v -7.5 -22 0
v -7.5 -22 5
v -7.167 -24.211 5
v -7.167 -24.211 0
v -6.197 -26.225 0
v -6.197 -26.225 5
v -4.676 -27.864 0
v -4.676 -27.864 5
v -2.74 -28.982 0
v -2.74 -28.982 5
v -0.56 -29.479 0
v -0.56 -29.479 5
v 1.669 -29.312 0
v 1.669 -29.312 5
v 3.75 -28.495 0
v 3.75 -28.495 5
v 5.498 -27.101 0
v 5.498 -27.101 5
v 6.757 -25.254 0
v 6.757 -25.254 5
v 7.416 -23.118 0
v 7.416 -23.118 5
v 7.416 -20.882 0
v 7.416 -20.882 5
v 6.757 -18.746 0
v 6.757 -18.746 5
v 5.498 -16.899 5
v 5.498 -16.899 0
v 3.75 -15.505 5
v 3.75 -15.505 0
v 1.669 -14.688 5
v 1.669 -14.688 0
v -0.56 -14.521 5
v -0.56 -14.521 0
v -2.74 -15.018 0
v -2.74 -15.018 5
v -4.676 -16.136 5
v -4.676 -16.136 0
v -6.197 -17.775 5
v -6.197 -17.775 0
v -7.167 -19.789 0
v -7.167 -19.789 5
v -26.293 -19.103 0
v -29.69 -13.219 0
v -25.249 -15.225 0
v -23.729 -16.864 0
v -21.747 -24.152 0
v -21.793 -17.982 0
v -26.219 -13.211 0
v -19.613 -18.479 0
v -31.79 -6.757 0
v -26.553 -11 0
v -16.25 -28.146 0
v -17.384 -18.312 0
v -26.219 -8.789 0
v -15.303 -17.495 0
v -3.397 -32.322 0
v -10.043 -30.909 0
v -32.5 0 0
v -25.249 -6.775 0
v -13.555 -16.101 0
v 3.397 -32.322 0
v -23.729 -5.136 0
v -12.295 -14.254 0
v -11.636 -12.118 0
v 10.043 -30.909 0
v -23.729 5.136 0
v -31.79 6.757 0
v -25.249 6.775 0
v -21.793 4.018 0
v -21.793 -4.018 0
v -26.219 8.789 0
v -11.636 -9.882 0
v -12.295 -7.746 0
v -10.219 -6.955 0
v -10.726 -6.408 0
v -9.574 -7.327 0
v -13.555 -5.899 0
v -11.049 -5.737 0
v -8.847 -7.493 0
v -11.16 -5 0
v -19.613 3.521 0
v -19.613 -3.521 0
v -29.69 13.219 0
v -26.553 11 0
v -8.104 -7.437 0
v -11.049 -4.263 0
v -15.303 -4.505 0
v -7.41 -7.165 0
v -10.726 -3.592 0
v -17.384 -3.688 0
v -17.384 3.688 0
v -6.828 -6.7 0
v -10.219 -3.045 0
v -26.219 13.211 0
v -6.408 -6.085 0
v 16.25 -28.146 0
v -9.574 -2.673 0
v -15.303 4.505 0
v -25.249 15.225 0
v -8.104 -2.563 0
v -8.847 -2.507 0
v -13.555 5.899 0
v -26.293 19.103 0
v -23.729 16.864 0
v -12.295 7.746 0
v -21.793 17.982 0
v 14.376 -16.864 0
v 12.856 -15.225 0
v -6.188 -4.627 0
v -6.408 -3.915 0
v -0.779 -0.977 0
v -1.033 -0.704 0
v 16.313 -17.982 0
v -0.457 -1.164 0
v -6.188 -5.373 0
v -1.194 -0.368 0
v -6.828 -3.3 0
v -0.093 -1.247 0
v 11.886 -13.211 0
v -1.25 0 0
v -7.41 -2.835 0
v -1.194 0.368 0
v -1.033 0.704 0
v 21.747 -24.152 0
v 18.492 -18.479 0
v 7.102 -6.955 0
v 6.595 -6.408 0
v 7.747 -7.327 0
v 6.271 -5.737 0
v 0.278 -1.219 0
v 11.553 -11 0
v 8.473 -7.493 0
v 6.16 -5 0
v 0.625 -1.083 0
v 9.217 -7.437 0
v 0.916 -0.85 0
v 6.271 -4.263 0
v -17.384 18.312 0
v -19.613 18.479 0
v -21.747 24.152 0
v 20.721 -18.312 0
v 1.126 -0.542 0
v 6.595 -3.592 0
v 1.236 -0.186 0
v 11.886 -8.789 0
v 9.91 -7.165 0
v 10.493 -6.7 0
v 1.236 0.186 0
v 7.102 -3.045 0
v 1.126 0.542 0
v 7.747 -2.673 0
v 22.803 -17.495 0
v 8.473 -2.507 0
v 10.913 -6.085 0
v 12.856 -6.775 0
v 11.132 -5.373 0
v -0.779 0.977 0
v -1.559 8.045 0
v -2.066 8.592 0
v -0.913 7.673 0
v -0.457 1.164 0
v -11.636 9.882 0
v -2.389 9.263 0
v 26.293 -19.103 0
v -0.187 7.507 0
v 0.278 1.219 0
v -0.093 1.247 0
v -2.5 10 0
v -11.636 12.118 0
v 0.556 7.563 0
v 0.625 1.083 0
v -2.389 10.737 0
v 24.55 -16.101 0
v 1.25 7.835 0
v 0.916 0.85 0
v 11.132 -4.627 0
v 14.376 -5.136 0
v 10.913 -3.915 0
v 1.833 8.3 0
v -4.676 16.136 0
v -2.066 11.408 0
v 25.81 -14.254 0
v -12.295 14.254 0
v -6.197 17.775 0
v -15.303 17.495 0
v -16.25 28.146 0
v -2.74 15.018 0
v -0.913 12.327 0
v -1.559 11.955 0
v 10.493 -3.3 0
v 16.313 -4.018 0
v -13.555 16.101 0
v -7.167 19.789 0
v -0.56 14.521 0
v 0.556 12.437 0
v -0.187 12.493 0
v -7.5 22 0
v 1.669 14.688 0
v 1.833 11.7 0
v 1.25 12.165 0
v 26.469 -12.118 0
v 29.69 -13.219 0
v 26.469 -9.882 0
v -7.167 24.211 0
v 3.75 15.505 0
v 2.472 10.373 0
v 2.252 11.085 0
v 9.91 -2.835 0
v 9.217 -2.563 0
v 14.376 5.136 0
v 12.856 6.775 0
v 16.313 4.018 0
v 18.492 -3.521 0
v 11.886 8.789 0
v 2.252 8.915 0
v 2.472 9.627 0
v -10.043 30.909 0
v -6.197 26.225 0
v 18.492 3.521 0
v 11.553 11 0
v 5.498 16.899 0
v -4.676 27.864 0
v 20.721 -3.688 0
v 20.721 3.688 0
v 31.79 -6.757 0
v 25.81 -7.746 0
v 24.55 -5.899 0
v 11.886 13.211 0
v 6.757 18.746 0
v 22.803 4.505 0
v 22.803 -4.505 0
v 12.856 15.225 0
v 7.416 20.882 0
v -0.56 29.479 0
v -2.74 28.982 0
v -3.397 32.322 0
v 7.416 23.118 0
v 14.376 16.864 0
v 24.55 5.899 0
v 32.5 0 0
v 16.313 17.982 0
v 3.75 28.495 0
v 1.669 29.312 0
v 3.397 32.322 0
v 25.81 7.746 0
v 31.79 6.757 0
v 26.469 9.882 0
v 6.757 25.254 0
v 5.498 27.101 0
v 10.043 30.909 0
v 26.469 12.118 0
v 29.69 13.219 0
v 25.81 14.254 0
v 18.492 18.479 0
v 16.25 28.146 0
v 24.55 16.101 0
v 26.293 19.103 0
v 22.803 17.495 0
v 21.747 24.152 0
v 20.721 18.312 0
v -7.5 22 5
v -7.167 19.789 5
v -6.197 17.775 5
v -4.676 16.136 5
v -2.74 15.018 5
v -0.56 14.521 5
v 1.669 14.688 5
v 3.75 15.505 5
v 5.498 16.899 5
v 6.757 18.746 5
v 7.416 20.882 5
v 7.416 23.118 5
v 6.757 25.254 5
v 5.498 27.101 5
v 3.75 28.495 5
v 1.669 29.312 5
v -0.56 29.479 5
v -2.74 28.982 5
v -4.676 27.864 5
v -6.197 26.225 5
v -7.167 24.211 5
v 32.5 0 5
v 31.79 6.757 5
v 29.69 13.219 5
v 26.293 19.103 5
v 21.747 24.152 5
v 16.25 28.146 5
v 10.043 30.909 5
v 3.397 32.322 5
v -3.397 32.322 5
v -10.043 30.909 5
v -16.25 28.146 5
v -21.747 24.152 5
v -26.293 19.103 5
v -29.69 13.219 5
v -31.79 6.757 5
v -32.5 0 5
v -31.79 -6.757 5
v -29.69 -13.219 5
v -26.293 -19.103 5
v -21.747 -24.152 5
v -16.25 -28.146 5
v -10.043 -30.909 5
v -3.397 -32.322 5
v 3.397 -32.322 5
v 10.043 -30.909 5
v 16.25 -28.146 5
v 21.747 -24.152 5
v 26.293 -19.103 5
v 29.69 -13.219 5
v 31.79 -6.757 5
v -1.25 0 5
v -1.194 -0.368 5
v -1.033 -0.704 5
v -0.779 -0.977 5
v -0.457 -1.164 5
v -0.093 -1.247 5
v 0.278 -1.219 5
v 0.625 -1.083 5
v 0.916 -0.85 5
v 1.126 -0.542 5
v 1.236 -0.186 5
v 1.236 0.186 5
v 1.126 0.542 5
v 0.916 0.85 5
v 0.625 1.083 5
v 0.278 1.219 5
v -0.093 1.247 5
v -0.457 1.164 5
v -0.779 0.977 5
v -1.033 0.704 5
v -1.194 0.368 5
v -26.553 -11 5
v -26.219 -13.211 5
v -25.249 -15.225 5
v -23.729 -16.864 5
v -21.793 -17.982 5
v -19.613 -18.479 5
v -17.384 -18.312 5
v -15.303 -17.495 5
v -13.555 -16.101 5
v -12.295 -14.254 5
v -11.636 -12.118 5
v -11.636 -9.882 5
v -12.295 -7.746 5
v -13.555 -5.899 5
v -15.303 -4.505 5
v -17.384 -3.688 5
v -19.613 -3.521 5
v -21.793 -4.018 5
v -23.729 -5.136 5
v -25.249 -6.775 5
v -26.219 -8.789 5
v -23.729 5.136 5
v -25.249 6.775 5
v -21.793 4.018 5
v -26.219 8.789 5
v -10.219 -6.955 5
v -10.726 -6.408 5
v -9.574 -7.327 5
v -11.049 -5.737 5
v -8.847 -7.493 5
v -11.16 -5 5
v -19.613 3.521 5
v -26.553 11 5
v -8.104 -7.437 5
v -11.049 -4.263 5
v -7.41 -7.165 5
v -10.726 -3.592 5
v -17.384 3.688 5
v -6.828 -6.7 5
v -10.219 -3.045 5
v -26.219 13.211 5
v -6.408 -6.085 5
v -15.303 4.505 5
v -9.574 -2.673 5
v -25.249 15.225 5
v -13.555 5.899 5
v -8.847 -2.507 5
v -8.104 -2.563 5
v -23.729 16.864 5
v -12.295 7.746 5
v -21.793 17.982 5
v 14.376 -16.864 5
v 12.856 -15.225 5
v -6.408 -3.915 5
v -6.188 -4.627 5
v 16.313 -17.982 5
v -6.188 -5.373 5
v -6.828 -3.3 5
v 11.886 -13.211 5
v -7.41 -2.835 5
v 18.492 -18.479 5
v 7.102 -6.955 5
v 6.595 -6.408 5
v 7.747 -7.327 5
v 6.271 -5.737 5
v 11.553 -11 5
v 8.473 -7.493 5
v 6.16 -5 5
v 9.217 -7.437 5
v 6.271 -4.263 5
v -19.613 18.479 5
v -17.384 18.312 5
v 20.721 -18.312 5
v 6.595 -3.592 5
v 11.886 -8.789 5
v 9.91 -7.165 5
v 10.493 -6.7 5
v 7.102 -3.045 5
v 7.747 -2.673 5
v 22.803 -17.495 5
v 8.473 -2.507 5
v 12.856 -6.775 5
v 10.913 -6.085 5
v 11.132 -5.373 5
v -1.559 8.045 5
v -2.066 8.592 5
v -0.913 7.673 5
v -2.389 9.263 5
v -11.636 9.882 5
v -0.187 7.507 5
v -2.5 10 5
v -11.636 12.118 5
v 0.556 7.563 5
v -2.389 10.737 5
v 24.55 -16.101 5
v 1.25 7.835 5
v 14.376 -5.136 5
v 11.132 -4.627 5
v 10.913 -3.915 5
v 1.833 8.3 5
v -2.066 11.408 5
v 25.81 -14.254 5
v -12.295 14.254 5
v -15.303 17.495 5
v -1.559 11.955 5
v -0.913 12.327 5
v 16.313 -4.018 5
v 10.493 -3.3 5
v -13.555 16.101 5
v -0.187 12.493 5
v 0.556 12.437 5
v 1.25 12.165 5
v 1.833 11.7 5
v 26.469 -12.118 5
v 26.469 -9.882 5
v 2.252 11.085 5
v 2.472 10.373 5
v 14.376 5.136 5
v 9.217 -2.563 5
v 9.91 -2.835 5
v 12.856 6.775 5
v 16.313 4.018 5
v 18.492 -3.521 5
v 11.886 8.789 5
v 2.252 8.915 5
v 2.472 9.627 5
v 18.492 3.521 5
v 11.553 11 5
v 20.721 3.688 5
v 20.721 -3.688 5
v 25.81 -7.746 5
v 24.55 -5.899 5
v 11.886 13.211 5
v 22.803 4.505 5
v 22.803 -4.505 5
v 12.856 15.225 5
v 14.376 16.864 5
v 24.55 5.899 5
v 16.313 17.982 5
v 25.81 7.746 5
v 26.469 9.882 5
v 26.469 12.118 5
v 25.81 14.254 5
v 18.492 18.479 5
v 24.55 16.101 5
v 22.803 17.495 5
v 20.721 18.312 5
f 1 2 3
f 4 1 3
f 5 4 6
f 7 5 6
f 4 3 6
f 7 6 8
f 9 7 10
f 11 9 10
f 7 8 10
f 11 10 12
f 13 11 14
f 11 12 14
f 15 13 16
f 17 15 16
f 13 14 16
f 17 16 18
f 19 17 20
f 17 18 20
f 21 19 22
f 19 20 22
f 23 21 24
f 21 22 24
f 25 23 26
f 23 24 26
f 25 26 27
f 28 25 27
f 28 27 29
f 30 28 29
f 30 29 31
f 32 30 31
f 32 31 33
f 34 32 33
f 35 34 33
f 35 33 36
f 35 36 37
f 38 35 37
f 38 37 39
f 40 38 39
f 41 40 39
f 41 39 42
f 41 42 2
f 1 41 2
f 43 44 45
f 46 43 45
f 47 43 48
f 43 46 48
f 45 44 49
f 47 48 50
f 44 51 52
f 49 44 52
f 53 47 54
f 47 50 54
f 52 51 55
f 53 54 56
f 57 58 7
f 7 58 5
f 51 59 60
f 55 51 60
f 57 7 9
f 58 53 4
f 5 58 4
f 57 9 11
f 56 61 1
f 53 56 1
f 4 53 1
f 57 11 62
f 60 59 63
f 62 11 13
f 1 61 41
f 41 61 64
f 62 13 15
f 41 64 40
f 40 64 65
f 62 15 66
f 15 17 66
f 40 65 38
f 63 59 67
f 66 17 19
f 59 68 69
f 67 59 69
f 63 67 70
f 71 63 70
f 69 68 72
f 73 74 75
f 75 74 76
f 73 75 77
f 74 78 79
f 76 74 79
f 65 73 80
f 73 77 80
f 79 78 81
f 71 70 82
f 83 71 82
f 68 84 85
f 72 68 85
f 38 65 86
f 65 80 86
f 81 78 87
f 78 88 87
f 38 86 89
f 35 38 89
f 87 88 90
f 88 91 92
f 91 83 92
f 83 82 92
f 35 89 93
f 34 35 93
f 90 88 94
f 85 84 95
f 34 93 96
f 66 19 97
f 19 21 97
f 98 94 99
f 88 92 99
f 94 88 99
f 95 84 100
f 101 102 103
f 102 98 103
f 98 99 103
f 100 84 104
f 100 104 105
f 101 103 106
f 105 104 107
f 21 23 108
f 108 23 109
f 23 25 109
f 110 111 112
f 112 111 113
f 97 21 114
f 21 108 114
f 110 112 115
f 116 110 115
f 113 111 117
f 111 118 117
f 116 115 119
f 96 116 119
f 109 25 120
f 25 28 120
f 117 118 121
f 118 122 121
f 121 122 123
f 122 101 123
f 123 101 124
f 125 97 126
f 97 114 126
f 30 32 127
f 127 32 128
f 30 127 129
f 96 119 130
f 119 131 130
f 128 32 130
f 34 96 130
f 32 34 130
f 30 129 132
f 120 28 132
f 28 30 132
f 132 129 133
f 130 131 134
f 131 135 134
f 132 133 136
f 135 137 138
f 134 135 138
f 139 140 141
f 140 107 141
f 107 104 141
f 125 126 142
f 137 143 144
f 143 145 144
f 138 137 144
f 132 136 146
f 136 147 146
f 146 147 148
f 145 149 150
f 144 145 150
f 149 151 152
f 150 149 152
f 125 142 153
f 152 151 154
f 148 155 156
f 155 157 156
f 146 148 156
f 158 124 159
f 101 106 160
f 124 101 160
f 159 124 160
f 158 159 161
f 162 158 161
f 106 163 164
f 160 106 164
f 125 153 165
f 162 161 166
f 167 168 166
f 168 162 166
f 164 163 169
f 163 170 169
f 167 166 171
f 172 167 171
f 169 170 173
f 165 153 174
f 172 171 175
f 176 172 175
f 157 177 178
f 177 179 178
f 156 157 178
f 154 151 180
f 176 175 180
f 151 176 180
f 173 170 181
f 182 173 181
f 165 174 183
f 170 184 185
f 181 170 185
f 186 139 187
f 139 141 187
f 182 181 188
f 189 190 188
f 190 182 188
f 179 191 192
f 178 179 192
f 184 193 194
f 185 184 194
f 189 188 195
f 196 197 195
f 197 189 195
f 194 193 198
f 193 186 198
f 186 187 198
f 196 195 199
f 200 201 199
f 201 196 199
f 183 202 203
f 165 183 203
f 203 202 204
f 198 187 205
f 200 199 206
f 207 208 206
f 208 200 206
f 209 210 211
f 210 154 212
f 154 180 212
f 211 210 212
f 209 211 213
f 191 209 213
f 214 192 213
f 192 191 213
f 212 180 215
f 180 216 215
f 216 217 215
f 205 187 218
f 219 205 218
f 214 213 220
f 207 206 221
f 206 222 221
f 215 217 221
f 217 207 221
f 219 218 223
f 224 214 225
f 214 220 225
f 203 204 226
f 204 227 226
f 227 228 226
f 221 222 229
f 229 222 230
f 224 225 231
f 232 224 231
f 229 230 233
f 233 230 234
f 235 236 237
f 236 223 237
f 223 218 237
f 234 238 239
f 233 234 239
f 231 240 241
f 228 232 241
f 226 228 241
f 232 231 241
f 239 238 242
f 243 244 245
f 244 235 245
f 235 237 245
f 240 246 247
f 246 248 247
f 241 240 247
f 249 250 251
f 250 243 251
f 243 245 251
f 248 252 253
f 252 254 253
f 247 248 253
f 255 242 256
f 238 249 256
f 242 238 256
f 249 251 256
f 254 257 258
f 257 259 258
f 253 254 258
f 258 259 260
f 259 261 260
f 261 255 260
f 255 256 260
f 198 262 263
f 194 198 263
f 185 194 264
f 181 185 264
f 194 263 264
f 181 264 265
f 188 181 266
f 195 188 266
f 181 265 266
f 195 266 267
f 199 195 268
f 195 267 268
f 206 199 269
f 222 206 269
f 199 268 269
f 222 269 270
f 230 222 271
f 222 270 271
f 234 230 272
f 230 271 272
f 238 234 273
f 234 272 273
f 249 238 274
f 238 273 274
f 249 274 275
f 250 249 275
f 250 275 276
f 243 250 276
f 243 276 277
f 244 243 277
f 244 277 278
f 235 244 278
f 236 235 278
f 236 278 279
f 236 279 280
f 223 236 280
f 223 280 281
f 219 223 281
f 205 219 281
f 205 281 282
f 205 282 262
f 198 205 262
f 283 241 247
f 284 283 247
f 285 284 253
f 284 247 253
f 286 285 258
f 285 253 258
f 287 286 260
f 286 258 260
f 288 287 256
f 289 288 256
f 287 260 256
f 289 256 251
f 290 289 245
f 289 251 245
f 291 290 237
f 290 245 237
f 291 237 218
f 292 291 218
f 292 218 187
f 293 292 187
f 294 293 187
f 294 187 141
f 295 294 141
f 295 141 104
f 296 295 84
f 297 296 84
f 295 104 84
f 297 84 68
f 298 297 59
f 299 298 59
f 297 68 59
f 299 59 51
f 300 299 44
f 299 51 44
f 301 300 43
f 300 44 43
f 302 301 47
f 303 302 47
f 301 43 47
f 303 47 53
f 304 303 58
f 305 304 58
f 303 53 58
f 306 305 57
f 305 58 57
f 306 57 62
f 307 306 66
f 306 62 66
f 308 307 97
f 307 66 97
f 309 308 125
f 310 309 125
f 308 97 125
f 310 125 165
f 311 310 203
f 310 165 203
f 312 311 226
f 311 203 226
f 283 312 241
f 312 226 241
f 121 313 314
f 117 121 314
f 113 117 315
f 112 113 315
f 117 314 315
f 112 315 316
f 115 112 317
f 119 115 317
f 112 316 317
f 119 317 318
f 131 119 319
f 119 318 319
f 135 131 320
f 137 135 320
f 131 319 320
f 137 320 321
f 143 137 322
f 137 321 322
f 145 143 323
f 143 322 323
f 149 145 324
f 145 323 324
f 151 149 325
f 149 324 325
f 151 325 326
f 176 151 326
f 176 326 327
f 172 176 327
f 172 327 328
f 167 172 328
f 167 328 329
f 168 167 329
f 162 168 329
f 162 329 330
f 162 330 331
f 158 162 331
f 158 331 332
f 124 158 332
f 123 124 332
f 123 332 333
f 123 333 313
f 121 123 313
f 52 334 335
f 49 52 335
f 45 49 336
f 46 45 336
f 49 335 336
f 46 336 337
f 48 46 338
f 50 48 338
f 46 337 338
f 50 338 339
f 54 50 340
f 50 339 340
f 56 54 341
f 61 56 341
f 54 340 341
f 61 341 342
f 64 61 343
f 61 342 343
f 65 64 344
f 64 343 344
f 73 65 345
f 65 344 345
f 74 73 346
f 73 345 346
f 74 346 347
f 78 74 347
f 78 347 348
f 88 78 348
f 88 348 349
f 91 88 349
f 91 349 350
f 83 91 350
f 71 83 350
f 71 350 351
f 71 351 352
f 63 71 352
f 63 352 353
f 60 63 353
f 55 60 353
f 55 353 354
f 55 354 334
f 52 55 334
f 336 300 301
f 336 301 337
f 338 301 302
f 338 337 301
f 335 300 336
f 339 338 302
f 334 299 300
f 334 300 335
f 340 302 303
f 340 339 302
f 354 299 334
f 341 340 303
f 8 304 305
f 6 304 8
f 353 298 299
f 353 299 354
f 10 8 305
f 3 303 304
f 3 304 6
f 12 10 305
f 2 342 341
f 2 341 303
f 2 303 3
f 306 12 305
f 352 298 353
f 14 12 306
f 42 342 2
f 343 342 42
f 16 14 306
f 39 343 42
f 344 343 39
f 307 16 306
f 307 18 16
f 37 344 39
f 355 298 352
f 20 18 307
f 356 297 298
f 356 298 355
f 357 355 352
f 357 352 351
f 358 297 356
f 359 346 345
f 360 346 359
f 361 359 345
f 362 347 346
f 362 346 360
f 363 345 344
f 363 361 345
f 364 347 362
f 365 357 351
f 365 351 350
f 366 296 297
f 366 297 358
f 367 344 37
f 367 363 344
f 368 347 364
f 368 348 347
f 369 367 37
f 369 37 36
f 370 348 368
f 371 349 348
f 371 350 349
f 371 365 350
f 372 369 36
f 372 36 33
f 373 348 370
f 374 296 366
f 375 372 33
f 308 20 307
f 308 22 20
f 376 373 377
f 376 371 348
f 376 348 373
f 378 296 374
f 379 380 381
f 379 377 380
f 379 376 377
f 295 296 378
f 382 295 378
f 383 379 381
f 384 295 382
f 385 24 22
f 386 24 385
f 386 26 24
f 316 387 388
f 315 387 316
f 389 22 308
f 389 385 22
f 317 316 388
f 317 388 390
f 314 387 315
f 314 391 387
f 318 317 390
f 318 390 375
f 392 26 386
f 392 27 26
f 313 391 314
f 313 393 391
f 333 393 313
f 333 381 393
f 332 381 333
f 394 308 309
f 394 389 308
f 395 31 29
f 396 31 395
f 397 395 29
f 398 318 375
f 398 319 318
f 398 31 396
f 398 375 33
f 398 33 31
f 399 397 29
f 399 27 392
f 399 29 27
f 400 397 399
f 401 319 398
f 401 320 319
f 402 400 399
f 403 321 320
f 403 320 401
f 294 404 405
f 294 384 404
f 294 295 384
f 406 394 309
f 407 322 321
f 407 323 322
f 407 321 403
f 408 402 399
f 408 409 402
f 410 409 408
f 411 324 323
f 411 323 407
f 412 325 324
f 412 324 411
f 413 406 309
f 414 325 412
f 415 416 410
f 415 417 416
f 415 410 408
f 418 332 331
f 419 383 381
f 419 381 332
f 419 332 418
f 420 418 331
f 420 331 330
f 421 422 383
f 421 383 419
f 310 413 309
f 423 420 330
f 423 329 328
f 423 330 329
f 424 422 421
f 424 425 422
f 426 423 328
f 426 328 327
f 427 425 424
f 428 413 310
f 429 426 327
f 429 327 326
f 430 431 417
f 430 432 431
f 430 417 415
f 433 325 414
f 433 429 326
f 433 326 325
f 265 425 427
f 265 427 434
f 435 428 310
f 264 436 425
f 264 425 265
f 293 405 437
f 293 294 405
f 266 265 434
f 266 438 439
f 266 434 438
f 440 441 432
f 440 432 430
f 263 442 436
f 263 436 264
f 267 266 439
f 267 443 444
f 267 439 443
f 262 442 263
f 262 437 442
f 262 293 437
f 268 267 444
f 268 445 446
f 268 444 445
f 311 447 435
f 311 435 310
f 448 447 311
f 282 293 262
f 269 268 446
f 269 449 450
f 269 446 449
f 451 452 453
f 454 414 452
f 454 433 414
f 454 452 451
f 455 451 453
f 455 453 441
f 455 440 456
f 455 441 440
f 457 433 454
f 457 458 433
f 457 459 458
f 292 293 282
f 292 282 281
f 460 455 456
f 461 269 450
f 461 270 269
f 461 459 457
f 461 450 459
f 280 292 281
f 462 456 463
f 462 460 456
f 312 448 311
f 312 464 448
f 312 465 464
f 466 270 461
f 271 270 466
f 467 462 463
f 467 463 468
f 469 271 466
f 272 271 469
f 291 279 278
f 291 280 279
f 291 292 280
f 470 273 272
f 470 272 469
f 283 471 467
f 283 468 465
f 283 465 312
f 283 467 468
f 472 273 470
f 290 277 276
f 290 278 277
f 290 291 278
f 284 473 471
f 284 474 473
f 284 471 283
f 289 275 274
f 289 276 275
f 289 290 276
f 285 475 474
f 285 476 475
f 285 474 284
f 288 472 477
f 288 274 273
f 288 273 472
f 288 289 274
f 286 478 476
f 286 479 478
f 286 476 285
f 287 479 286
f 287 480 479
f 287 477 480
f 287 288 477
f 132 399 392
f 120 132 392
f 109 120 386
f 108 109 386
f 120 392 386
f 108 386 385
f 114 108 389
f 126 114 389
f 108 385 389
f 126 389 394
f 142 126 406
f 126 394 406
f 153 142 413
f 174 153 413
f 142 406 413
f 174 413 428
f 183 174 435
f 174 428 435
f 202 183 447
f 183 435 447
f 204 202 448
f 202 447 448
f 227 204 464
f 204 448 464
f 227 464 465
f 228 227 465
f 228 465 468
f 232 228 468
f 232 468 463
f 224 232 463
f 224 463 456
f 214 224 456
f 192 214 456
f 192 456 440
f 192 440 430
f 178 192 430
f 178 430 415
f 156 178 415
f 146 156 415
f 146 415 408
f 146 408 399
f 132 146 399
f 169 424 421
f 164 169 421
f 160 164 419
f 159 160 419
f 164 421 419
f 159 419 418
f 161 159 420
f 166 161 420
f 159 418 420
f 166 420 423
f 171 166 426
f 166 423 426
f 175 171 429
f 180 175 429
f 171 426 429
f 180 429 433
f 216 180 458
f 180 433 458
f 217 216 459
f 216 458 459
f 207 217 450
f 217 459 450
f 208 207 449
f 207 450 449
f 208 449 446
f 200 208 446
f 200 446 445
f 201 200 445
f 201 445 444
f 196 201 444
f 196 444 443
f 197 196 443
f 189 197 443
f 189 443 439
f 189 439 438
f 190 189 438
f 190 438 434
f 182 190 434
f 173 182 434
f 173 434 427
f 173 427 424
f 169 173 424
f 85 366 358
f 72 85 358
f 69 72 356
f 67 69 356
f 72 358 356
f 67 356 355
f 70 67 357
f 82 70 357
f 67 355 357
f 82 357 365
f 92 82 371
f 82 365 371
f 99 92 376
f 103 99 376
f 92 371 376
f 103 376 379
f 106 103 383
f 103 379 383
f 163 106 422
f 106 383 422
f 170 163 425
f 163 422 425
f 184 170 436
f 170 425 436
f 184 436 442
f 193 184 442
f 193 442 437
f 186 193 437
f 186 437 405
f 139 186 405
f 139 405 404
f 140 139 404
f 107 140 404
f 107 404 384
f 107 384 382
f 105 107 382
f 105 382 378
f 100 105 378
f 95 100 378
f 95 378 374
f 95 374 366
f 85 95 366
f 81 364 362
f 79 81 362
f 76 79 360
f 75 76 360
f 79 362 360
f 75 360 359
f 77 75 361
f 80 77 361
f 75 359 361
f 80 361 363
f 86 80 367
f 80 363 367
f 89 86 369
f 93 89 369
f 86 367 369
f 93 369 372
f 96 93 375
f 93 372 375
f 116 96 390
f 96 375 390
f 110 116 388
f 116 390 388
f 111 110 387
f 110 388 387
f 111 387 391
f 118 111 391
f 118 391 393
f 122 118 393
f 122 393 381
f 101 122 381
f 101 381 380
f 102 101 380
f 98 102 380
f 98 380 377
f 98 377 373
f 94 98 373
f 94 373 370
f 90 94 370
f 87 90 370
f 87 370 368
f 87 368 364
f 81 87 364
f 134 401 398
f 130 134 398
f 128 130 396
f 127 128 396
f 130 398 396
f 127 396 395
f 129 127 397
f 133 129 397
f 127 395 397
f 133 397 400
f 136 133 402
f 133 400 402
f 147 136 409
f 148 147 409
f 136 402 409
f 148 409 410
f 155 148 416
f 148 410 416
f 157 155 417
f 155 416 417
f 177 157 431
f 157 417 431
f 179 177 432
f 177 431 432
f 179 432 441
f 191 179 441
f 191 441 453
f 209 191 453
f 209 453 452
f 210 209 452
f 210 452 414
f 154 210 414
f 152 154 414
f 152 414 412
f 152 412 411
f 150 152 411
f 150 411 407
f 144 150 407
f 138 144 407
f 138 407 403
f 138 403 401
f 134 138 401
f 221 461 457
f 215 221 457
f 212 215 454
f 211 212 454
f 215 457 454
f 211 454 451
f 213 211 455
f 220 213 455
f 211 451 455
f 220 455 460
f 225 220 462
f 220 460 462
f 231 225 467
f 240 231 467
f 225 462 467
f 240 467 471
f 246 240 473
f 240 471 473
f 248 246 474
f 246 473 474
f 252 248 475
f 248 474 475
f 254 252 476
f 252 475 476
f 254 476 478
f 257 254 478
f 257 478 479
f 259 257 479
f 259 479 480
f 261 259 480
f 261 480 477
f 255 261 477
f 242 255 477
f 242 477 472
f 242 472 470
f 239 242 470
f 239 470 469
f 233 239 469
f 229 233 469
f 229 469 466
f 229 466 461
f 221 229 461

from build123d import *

# Parameters (mm, degrees)
F0_R     = 32.5
F1_DEPTH = 5
F2_D     = 15
F3_D     = 5
F4_D     = 2.5
F4_DEPTH = 10
F4_TIP   = 0.7510757738


with BuildPart() as f1:
    # F0 (on Top) → F1 (new body)
    with BuildSketch(Plane.XY):
        Circle(F0_R)
    extrude(amount=F1_DEPTH)

    # F2 (through all)
    with Locations(Plane(origin=(0, 0, 0), x_dir=(1, 0, 0), z_dir=(0, 0, -1))):
        with Locations((19.0525588833, -11), (0, -22), (-19.0525588833, -11), (-19.0525588833, 11), (0, 22), (19.0525588833, 11)):
            Hole(F2_D / 2)

    # F3 (through all)
    with Locations(Plane(origin=(0, 0, 0), x_dir=(1, 0, 0), z_dir=(0, 0, -1))):
        with Locations((-8.6602540378, 5), (0, -10), (8.6602540378, 5)):
            Hole(F3_D / 2)

    # F4
    with Locations(Plane(origin=(0, 0, 0), x_dir=(1, 0, 0), z_dir=(0, 0, -1))):
        with Locations((0, 0)):
            Hole(F4_D / 2, depth=F4_DEPTH)
            with Locations((0, 0, -(F4_DEPTH + F4_TIP / 2))):  # 118° drill point
                Cone(0, F4_D / 2, F4_TIP, mode=Mode.SUBTRACT)


solid = f1.part
